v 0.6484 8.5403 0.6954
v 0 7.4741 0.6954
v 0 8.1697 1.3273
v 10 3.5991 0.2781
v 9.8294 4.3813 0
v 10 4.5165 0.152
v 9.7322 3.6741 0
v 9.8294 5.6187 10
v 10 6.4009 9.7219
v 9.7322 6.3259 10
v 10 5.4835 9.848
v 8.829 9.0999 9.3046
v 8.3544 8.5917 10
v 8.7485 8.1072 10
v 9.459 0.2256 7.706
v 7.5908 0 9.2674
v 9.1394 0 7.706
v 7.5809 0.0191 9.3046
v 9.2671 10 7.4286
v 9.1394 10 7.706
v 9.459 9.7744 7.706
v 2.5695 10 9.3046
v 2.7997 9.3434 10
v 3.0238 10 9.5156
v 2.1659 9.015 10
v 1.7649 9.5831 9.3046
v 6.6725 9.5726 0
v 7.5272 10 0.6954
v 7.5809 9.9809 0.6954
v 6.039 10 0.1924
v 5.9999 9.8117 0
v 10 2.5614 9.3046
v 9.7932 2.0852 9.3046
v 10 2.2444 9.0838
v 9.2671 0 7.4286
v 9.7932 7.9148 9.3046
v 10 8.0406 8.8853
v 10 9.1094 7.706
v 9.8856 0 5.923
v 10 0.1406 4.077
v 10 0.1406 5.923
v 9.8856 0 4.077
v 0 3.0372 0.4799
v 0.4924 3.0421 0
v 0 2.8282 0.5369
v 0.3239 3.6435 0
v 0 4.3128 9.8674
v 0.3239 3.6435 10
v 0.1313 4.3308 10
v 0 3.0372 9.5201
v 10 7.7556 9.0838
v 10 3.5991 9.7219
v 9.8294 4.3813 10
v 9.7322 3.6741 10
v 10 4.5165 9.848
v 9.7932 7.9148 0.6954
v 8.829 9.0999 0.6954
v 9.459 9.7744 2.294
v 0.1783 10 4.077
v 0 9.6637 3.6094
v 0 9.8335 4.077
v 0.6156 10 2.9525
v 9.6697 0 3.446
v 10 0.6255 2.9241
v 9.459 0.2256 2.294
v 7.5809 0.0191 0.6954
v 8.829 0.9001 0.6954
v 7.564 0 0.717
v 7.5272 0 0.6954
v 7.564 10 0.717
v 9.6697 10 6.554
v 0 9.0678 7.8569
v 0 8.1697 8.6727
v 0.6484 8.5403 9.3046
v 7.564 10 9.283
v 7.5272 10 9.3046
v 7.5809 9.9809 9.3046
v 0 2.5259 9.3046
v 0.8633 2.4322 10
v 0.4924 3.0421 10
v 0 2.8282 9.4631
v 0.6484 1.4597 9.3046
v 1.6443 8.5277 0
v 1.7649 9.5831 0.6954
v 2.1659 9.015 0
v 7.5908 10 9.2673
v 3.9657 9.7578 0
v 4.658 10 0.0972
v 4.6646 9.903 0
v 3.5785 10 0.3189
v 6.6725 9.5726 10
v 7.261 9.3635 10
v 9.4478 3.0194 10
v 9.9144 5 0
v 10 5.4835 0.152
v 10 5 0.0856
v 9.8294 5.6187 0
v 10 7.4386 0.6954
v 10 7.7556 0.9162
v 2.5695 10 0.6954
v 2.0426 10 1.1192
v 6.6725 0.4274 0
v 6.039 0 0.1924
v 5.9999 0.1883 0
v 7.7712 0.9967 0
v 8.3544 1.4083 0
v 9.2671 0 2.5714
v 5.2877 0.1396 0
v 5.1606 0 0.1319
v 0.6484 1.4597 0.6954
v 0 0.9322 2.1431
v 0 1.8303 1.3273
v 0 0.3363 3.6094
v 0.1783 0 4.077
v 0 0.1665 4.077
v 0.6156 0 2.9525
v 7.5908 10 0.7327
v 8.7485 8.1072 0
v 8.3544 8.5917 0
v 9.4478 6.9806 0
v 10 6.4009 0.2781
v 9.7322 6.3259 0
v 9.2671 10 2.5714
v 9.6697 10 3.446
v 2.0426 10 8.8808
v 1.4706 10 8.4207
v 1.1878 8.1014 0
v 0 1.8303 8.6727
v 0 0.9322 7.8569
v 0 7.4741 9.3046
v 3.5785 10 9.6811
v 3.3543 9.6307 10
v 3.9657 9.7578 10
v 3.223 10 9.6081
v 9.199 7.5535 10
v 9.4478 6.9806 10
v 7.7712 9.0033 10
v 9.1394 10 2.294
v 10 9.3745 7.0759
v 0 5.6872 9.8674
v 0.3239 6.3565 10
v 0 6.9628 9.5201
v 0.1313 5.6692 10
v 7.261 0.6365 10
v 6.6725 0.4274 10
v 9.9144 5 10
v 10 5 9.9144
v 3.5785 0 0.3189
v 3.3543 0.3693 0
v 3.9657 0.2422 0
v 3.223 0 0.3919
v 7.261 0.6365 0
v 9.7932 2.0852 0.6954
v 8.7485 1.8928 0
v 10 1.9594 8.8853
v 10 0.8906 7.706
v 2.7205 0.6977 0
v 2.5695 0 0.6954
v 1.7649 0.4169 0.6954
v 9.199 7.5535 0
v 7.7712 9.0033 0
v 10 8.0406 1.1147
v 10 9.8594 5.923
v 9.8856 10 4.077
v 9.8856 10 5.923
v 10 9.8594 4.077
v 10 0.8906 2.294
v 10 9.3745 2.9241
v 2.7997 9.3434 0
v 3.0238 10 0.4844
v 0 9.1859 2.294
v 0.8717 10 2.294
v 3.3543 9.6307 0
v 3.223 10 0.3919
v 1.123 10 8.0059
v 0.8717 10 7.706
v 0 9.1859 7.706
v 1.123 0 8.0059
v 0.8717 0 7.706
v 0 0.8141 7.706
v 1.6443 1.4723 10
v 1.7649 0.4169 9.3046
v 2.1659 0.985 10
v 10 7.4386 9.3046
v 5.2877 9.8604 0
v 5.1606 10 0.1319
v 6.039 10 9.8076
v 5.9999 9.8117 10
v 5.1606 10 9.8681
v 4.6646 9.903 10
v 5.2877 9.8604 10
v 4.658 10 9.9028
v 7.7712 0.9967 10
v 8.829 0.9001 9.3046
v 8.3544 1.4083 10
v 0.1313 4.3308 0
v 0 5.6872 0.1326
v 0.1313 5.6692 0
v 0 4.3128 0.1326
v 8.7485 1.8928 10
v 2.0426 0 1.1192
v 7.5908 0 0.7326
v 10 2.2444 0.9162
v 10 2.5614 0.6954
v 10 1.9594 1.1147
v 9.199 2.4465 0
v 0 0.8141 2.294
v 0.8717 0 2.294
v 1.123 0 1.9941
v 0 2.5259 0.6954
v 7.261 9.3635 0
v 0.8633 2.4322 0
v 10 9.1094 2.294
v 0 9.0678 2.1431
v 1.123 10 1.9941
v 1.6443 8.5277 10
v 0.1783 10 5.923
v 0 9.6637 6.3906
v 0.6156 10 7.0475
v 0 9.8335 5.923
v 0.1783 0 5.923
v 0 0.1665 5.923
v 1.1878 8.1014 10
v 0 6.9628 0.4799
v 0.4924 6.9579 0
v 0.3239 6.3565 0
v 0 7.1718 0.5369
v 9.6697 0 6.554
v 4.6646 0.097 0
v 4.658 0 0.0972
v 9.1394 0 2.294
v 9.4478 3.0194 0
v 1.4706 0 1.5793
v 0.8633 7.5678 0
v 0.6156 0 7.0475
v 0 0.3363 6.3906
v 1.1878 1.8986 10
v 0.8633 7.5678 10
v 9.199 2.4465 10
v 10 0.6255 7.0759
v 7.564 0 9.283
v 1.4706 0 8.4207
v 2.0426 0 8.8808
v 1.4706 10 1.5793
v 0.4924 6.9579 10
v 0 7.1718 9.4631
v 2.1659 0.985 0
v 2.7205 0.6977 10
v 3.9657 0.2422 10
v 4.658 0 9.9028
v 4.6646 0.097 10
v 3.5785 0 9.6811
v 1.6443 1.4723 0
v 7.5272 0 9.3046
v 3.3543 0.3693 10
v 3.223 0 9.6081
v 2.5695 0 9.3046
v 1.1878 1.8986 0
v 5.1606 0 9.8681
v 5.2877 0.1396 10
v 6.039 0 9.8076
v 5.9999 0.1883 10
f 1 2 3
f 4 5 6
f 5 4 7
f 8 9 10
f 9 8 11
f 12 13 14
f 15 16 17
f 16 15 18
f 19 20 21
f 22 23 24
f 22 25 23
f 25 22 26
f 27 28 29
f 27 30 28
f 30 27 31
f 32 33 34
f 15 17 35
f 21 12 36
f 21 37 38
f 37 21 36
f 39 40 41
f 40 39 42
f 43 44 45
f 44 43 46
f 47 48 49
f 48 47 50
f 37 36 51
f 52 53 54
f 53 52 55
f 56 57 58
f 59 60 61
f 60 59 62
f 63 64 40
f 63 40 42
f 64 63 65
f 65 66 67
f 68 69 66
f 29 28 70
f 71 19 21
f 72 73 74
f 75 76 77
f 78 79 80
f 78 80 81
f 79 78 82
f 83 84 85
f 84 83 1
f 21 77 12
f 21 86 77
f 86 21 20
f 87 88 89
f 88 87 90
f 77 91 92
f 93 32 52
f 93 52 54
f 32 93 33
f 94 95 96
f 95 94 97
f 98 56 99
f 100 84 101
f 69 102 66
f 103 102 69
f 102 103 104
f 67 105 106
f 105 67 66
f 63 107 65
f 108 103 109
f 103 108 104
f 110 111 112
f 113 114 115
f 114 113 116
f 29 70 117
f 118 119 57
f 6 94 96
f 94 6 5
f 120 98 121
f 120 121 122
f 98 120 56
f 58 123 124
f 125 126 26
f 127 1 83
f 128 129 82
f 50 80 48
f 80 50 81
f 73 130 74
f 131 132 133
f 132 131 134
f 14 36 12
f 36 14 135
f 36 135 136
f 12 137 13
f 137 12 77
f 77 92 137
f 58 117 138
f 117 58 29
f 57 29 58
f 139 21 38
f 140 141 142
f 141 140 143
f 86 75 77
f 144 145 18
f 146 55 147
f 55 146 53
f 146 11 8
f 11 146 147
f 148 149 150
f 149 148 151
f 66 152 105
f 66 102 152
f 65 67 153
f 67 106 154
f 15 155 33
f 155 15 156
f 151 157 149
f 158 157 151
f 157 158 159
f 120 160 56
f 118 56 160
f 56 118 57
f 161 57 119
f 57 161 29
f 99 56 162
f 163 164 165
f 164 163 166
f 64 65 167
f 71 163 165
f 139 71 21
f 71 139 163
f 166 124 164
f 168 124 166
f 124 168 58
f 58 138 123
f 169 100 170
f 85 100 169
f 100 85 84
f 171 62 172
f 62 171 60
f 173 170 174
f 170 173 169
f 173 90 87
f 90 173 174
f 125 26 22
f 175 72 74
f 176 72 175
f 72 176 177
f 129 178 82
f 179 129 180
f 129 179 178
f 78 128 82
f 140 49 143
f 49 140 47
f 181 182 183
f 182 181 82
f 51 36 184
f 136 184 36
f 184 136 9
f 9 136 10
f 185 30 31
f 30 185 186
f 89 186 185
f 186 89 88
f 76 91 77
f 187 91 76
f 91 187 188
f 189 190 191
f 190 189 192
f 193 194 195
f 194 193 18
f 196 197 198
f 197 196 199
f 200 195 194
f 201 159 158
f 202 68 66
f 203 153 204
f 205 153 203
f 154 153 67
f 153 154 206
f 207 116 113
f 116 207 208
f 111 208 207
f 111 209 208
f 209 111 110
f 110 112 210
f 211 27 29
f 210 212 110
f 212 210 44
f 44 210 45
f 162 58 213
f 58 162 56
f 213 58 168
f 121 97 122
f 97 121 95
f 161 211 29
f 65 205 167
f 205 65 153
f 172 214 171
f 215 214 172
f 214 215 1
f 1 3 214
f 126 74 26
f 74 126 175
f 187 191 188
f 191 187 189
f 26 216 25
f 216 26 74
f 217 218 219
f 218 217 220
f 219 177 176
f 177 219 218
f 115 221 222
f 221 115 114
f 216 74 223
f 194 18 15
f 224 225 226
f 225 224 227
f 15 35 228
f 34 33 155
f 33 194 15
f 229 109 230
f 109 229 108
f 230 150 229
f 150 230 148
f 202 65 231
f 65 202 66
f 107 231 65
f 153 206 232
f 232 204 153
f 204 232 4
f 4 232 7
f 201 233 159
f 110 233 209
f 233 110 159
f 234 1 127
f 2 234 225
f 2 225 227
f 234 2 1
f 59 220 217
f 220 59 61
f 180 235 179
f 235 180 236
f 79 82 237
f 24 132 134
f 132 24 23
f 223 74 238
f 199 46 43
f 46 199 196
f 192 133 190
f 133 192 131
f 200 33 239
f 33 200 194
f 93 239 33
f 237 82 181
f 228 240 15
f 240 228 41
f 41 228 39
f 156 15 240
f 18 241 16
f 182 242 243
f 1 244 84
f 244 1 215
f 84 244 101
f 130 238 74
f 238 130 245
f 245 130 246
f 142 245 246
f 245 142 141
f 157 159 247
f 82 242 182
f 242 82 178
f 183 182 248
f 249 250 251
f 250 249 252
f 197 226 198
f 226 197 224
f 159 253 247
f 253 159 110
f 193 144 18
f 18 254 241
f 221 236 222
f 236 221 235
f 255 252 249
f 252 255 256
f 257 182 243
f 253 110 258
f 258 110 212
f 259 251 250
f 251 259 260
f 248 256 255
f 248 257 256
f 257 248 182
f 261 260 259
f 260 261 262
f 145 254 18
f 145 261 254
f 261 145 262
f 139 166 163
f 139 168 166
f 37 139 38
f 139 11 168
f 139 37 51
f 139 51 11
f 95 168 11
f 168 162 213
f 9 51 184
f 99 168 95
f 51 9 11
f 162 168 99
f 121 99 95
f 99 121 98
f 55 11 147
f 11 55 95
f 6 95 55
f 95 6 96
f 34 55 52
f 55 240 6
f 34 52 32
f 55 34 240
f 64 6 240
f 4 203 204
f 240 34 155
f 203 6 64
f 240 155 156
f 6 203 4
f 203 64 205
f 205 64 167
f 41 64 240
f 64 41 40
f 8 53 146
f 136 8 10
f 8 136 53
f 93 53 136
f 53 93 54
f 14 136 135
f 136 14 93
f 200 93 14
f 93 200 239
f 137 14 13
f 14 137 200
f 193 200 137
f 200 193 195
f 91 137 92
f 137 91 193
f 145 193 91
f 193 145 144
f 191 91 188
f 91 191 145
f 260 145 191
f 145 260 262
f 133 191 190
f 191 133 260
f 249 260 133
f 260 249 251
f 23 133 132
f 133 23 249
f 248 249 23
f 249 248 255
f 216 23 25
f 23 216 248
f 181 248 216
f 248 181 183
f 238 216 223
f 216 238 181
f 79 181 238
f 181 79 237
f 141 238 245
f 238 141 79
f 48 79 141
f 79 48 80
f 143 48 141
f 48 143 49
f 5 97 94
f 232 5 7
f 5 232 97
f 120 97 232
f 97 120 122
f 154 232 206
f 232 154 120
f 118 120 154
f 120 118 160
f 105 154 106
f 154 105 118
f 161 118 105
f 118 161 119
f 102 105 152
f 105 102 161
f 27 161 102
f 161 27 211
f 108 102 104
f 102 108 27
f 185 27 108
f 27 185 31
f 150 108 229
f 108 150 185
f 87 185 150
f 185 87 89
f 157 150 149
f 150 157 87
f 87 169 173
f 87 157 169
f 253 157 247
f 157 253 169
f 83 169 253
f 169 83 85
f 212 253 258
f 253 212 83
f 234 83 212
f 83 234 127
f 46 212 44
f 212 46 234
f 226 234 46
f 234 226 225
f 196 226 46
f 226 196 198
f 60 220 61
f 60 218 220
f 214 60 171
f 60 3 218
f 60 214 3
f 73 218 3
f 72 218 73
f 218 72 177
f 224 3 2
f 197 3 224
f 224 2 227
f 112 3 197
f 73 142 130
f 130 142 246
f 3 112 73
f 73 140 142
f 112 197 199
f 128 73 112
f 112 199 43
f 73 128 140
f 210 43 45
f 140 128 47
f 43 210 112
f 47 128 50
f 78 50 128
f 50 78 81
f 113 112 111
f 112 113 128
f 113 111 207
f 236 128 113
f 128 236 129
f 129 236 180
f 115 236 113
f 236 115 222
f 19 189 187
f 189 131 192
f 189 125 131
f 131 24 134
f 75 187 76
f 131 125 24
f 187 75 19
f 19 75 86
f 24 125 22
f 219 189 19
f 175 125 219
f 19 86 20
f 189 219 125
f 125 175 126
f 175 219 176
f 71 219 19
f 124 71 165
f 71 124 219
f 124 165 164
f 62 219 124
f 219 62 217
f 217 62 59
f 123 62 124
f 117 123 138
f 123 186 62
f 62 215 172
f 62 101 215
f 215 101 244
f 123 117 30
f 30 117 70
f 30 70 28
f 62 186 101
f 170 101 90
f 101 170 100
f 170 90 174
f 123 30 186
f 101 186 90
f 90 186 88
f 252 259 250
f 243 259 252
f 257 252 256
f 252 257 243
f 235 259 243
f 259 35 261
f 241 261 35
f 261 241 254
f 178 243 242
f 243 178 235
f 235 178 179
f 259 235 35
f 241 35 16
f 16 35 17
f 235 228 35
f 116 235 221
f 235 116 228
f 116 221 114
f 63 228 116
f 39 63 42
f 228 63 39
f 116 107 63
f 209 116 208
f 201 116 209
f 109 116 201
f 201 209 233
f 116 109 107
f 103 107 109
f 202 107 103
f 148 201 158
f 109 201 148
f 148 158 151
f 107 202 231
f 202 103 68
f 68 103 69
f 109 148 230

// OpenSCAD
//$fn = $preview ? 16 : 128;

module terning_6(side) {

    terning_x = side;
    terning_y = terning_x;
    terning_z = terning_x;
    curvage = sqrt(2);

    intersection() {
        translate([terning_x/2,terning_y/2,terning_z/2]) {
            sphere(d=terning_x*curvage);
        }
        cube([terning_x,terning_y,terning_z]);
    }

}

module terning_4_daabloe(side) {
}

terning_6(side=10);
